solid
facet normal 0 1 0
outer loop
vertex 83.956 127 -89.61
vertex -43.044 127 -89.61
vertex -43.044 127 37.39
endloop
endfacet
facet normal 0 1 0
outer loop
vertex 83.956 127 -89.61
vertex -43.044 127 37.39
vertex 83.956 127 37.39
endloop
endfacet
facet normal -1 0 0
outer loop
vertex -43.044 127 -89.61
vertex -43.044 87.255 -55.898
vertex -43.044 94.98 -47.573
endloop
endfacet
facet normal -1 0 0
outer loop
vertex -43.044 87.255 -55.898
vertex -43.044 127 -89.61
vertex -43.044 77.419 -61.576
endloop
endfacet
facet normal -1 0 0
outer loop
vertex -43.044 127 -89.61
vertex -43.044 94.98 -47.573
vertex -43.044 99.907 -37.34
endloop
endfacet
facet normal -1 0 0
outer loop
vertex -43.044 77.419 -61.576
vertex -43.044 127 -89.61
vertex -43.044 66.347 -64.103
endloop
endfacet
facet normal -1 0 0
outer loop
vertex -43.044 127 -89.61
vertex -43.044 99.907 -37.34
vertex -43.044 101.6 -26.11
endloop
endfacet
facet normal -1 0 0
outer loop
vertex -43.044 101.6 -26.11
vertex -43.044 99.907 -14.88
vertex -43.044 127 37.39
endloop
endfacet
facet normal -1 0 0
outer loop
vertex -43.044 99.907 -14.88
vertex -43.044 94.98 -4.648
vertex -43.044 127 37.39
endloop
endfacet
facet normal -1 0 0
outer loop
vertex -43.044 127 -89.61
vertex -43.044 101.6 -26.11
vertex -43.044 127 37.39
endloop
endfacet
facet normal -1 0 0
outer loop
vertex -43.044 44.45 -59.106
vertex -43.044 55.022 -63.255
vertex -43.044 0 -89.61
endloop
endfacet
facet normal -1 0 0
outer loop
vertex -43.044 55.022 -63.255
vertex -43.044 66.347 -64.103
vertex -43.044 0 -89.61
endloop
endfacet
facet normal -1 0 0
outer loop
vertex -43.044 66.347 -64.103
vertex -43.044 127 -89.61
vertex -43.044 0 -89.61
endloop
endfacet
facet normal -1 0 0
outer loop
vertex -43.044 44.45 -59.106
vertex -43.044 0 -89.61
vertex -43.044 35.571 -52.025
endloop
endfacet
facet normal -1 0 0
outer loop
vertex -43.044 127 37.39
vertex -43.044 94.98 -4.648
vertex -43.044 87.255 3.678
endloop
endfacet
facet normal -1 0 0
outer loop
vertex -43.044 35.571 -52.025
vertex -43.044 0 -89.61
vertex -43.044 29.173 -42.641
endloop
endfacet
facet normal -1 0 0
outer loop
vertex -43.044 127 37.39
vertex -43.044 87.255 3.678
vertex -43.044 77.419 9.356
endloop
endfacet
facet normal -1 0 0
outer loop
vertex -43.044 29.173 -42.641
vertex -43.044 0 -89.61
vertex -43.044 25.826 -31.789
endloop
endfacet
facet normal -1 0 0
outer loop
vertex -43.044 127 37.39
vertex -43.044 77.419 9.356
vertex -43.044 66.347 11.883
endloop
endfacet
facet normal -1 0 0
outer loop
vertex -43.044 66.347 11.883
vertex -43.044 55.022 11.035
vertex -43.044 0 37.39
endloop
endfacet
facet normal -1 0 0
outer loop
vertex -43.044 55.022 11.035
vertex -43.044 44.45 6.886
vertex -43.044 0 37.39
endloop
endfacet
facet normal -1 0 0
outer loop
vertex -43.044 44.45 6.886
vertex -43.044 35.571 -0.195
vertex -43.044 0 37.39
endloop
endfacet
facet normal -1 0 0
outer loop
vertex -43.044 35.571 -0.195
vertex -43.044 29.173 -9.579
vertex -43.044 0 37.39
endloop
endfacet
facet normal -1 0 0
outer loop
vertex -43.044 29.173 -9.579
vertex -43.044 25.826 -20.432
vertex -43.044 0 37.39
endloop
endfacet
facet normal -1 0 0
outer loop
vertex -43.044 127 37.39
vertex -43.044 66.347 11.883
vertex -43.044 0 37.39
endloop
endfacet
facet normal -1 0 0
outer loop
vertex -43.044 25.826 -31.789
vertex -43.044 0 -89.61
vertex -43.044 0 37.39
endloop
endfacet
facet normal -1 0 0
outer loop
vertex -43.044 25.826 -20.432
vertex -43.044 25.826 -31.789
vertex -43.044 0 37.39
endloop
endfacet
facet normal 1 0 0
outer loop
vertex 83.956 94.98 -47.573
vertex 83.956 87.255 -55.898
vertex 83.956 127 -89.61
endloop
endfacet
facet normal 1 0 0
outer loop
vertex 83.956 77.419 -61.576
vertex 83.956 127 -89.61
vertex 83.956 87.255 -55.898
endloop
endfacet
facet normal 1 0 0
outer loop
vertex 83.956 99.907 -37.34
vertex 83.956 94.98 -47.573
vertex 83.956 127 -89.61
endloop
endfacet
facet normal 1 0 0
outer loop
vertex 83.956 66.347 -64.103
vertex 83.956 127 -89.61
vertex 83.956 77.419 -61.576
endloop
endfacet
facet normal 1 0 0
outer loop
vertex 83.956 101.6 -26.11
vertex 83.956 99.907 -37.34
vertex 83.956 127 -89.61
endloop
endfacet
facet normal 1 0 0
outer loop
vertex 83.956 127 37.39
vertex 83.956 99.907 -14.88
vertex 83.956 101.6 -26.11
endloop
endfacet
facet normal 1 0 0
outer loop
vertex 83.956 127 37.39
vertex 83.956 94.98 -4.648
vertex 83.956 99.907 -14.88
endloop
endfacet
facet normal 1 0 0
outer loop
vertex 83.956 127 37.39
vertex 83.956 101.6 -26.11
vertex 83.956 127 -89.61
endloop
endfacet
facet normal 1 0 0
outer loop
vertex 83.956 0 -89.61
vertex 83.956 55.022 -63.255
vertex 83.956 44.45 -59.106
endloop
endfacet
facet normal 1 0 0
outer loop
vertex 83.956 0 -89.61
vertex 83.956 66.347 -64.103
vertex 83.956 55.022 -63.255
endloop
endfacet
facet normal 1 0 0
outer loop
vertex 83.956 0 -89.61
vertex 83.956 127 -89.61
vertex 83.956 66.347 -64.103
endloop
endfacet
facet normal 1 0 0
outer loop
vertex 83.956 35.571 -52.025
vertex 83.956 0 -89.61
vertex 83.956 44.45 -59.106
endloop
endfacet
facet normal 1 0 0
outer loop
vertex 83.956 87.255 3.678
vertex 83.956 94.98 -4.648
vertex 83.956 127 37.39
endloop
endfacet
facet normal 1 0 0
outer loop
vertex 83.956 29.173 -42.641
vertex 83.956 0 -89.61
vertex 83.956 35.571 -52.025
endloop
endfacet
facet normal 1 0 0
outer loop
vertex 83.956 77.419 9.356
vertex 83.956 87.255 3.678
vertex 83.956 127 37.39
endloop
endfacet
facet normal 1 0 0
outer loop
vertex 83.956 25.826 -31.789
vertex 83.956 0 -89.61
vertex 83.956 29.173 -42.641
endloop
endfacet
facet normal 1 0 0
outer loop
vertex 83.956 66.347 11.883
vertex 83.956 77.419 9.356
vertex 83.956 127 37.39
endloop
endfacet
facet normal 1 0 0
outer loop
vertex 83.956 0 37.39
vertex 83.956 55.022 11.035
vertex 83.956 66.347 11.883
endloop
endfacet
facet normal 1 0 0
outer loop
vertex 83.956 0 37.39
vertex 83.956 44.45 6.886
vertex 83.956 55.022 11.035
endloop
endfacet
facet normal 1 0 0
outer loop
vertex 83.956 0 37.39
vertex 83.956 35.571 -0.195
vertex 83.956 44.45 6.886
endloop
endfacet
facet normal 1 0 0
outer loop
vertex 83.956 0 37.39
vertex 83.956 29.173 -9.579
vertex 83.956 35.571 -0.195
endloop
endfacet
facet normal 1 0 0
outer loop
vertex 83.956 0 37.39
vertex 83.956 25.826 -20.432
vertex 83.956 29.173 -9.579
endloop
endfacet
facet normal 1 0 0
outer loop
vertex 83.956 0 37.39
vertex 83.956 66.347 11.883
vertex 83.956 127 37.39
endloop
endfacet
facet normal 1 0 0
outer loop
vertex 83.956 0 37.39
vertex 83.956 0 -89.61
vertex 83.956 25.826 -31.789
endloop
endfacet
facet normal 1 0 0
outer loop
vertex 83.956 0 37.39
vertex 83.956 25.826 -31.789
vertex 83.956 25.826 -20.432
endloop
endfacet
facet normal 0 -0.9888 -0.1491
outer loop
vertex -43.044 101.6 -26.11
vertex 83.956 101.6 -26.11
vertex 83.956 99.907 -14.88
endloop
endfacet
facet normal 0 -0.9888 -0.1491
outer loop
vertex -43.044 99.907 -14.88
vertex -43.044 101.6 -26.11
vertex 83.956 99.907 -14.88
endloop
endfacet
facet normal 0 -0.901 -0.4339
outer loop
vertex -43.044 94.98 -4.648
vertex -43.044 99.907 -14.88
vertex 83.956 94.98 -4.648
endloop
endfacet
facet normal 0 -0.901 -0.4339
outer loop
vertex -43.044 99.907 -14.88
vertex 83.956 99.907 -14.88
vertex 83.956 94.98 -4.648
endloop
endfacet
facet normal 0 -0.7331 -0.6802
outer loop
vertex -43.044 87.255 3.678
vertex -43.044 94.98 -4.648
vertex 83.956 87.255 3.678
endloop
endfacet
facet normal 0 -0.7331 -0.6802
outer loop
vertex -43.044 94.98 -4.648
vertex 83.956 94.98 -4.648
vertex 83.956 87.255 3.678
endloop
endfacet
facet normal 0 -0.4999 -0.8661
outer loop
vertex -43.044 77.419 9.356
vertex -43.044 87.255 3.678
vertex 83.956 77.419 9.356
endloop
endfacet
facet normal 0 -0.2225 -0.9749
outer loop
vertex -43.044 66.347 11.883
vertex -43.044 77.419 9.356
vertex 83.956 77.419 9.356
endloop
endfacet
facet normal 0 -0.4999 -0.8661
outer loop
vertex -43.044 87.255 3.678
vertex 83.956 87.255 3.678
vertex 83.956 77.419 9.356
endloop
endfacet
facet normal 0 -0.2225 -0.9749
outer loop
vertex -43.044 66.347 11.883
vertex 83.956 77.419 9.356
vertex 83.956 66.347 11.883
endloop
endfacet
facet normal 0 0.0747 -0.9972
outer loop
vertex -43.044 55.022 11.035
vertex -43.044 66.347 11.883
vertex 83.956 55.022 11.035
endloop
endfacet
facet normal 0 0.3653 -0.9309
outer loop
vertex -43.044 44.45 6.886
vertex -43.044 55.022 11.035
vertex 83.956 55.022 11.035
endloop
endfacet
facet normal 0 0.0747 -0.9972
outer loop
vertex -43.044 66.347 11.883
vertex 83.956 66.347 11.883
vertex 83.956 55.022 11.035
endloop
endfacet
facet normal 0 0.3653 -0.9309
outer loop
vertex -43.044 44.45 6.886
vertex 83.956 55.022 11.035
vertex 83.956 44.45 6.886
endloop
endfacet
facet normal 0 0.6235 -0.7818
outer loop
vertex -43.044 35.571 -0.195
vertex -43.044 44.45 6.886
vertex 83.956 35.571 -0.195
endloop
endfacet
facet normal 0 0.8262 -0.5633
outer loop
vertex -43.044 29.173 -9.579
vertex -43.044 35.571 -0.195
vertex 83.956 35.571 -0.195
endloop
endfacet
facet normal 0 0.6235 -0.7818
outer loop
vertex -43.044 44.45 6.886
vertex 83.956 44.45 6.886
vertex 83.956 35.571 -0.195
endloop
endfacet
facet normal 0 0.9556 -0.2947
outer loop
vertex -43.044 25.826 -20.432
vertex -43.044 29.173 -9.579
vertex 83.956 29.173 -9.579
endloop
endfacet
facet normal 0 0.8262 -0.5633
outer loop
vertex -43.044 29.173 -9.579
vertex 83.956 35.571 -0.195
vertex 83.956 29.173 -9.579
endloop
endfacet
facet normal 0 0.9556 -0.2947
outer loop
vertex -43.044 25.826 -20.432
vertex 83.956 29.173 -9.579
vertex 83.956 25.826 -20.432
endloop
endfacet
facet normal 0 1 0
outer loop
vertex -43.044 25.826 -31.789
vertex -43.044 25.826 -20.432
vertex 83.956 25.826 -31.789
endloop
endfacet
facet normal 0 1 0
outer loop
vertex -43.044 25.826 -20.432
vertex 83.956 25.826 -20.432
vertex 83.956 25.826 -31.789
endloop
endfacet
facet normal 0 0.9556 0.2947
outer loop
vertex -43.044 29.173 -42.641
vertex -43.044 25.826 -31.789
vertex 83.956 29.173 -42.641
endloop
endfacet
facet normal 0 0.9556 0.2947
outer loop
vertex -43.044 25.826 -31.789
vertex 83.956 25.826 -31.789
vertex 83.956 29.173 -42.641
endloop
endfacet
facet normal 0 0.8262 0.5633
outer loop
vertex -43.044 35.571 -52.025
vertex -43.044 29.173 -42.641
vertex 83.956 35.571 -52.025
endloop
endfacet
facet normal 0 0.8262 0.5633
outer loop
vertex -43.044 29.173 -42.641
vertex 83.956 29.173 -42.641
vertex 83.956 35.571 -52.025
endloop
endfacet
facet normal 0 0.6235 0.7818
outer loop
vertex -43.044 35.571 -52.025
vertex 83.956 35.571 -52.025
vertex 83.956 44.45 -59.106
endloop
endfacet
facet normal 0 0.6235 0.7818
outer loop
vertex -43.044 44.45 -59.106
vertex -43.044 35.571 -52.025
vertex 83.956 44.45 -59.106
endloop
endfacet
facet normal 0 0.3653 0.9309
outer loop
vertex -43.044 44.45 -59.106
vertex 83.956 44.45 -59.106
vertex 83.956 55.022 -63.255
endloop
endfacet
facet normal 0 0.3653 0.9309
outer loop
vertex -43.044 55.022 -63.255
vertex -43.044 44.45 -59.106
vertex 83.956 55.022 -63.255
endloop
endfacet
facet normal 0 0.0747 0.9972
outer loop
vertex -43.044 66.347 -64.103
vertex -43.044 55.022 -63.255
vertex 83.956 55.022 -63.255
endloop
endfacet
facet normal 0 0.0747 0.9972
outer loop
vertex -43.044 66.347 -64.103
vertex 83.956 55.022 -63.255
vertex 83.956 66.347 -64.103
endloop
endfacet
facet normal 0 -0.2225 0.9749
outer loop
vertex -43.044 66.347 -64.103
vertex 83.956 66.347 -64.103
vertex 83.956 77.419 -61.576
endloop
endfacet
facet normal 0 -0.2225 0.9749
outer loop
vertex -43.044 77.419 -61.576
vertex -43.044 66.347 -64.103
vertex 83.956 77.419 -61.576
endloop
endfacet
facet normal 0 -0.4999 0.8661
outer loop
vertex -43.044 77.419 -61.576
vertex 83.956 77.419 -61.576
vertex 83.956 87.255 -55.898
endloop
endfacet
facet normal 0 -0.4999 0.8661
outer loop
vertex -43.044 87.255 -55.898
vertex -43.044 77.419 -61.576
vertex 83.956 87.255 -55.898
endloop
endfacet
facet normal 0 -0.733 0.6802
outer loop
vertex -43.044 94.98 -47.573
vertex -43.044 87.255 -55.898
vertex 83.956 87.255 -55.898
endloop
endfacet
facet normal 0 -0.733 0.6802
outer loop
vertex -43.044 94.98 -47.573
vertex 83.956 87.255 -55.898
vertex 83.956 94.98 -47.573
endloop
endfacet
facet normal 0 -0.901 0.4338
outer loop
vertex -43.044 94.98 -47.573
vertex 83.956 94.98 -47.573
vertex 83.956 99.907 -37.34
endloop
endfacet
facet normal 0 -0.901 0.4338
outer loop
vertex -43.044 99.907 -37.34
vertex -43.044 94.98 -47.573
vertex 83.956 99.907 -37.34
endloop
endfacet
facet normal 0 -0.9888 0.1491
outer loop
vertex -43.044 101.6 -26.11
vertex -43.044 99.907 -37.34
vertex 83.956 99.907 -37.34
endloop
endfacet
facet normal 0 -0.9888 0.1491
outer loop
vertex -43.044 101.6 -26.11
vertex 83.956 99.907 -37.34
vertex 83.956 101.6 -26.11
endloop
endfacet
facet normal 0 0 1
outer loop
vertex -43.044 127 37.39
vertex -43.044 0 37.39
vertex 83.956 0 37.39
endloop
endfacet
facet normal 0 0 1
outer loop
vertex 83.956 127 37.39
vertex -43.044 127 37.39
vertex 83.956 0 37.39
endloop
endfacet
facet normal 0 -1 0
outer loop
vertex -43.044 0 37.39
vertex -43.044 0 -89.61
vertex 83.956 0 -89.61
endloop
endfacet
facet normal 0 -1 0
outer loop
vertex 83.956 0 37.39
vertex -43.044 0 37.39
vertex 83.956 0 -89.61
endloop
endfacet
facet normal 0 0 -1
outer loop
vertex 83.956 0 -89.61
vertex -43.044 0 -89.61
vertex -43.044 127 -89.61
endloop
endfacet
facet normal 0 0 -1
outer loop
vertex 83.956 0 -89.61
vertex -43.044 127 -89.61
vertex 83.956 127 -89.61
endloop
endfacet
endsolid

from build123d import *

# Parameters (mm, degrees)
F0_W     = 127
F0_H     = 127
F1_DEPTH = 127
F2_R     = 38.1
F3_DEPTH = 127.001


with BuildPart() as f1:
    # F0 (on Front) → F1 (new body)
    with BuildSketch(Plane.XZ):
        with Locations((20.456394, -26.110025)):
            Rectangle(F0_W, F0_H)
    extrude(amount=-F1_DEPTH)

    # F2 (on face) → F3 (cut, through all)
    with BuildSketch(Plane.YZ.offset(83.956394)):
        with Locations((63.5, -26.110025)):
            Circle(F2_R)
    extrude(amount=-F3_DEPTH, mode=Mode.SUBTRACT)


solid = f1.part
